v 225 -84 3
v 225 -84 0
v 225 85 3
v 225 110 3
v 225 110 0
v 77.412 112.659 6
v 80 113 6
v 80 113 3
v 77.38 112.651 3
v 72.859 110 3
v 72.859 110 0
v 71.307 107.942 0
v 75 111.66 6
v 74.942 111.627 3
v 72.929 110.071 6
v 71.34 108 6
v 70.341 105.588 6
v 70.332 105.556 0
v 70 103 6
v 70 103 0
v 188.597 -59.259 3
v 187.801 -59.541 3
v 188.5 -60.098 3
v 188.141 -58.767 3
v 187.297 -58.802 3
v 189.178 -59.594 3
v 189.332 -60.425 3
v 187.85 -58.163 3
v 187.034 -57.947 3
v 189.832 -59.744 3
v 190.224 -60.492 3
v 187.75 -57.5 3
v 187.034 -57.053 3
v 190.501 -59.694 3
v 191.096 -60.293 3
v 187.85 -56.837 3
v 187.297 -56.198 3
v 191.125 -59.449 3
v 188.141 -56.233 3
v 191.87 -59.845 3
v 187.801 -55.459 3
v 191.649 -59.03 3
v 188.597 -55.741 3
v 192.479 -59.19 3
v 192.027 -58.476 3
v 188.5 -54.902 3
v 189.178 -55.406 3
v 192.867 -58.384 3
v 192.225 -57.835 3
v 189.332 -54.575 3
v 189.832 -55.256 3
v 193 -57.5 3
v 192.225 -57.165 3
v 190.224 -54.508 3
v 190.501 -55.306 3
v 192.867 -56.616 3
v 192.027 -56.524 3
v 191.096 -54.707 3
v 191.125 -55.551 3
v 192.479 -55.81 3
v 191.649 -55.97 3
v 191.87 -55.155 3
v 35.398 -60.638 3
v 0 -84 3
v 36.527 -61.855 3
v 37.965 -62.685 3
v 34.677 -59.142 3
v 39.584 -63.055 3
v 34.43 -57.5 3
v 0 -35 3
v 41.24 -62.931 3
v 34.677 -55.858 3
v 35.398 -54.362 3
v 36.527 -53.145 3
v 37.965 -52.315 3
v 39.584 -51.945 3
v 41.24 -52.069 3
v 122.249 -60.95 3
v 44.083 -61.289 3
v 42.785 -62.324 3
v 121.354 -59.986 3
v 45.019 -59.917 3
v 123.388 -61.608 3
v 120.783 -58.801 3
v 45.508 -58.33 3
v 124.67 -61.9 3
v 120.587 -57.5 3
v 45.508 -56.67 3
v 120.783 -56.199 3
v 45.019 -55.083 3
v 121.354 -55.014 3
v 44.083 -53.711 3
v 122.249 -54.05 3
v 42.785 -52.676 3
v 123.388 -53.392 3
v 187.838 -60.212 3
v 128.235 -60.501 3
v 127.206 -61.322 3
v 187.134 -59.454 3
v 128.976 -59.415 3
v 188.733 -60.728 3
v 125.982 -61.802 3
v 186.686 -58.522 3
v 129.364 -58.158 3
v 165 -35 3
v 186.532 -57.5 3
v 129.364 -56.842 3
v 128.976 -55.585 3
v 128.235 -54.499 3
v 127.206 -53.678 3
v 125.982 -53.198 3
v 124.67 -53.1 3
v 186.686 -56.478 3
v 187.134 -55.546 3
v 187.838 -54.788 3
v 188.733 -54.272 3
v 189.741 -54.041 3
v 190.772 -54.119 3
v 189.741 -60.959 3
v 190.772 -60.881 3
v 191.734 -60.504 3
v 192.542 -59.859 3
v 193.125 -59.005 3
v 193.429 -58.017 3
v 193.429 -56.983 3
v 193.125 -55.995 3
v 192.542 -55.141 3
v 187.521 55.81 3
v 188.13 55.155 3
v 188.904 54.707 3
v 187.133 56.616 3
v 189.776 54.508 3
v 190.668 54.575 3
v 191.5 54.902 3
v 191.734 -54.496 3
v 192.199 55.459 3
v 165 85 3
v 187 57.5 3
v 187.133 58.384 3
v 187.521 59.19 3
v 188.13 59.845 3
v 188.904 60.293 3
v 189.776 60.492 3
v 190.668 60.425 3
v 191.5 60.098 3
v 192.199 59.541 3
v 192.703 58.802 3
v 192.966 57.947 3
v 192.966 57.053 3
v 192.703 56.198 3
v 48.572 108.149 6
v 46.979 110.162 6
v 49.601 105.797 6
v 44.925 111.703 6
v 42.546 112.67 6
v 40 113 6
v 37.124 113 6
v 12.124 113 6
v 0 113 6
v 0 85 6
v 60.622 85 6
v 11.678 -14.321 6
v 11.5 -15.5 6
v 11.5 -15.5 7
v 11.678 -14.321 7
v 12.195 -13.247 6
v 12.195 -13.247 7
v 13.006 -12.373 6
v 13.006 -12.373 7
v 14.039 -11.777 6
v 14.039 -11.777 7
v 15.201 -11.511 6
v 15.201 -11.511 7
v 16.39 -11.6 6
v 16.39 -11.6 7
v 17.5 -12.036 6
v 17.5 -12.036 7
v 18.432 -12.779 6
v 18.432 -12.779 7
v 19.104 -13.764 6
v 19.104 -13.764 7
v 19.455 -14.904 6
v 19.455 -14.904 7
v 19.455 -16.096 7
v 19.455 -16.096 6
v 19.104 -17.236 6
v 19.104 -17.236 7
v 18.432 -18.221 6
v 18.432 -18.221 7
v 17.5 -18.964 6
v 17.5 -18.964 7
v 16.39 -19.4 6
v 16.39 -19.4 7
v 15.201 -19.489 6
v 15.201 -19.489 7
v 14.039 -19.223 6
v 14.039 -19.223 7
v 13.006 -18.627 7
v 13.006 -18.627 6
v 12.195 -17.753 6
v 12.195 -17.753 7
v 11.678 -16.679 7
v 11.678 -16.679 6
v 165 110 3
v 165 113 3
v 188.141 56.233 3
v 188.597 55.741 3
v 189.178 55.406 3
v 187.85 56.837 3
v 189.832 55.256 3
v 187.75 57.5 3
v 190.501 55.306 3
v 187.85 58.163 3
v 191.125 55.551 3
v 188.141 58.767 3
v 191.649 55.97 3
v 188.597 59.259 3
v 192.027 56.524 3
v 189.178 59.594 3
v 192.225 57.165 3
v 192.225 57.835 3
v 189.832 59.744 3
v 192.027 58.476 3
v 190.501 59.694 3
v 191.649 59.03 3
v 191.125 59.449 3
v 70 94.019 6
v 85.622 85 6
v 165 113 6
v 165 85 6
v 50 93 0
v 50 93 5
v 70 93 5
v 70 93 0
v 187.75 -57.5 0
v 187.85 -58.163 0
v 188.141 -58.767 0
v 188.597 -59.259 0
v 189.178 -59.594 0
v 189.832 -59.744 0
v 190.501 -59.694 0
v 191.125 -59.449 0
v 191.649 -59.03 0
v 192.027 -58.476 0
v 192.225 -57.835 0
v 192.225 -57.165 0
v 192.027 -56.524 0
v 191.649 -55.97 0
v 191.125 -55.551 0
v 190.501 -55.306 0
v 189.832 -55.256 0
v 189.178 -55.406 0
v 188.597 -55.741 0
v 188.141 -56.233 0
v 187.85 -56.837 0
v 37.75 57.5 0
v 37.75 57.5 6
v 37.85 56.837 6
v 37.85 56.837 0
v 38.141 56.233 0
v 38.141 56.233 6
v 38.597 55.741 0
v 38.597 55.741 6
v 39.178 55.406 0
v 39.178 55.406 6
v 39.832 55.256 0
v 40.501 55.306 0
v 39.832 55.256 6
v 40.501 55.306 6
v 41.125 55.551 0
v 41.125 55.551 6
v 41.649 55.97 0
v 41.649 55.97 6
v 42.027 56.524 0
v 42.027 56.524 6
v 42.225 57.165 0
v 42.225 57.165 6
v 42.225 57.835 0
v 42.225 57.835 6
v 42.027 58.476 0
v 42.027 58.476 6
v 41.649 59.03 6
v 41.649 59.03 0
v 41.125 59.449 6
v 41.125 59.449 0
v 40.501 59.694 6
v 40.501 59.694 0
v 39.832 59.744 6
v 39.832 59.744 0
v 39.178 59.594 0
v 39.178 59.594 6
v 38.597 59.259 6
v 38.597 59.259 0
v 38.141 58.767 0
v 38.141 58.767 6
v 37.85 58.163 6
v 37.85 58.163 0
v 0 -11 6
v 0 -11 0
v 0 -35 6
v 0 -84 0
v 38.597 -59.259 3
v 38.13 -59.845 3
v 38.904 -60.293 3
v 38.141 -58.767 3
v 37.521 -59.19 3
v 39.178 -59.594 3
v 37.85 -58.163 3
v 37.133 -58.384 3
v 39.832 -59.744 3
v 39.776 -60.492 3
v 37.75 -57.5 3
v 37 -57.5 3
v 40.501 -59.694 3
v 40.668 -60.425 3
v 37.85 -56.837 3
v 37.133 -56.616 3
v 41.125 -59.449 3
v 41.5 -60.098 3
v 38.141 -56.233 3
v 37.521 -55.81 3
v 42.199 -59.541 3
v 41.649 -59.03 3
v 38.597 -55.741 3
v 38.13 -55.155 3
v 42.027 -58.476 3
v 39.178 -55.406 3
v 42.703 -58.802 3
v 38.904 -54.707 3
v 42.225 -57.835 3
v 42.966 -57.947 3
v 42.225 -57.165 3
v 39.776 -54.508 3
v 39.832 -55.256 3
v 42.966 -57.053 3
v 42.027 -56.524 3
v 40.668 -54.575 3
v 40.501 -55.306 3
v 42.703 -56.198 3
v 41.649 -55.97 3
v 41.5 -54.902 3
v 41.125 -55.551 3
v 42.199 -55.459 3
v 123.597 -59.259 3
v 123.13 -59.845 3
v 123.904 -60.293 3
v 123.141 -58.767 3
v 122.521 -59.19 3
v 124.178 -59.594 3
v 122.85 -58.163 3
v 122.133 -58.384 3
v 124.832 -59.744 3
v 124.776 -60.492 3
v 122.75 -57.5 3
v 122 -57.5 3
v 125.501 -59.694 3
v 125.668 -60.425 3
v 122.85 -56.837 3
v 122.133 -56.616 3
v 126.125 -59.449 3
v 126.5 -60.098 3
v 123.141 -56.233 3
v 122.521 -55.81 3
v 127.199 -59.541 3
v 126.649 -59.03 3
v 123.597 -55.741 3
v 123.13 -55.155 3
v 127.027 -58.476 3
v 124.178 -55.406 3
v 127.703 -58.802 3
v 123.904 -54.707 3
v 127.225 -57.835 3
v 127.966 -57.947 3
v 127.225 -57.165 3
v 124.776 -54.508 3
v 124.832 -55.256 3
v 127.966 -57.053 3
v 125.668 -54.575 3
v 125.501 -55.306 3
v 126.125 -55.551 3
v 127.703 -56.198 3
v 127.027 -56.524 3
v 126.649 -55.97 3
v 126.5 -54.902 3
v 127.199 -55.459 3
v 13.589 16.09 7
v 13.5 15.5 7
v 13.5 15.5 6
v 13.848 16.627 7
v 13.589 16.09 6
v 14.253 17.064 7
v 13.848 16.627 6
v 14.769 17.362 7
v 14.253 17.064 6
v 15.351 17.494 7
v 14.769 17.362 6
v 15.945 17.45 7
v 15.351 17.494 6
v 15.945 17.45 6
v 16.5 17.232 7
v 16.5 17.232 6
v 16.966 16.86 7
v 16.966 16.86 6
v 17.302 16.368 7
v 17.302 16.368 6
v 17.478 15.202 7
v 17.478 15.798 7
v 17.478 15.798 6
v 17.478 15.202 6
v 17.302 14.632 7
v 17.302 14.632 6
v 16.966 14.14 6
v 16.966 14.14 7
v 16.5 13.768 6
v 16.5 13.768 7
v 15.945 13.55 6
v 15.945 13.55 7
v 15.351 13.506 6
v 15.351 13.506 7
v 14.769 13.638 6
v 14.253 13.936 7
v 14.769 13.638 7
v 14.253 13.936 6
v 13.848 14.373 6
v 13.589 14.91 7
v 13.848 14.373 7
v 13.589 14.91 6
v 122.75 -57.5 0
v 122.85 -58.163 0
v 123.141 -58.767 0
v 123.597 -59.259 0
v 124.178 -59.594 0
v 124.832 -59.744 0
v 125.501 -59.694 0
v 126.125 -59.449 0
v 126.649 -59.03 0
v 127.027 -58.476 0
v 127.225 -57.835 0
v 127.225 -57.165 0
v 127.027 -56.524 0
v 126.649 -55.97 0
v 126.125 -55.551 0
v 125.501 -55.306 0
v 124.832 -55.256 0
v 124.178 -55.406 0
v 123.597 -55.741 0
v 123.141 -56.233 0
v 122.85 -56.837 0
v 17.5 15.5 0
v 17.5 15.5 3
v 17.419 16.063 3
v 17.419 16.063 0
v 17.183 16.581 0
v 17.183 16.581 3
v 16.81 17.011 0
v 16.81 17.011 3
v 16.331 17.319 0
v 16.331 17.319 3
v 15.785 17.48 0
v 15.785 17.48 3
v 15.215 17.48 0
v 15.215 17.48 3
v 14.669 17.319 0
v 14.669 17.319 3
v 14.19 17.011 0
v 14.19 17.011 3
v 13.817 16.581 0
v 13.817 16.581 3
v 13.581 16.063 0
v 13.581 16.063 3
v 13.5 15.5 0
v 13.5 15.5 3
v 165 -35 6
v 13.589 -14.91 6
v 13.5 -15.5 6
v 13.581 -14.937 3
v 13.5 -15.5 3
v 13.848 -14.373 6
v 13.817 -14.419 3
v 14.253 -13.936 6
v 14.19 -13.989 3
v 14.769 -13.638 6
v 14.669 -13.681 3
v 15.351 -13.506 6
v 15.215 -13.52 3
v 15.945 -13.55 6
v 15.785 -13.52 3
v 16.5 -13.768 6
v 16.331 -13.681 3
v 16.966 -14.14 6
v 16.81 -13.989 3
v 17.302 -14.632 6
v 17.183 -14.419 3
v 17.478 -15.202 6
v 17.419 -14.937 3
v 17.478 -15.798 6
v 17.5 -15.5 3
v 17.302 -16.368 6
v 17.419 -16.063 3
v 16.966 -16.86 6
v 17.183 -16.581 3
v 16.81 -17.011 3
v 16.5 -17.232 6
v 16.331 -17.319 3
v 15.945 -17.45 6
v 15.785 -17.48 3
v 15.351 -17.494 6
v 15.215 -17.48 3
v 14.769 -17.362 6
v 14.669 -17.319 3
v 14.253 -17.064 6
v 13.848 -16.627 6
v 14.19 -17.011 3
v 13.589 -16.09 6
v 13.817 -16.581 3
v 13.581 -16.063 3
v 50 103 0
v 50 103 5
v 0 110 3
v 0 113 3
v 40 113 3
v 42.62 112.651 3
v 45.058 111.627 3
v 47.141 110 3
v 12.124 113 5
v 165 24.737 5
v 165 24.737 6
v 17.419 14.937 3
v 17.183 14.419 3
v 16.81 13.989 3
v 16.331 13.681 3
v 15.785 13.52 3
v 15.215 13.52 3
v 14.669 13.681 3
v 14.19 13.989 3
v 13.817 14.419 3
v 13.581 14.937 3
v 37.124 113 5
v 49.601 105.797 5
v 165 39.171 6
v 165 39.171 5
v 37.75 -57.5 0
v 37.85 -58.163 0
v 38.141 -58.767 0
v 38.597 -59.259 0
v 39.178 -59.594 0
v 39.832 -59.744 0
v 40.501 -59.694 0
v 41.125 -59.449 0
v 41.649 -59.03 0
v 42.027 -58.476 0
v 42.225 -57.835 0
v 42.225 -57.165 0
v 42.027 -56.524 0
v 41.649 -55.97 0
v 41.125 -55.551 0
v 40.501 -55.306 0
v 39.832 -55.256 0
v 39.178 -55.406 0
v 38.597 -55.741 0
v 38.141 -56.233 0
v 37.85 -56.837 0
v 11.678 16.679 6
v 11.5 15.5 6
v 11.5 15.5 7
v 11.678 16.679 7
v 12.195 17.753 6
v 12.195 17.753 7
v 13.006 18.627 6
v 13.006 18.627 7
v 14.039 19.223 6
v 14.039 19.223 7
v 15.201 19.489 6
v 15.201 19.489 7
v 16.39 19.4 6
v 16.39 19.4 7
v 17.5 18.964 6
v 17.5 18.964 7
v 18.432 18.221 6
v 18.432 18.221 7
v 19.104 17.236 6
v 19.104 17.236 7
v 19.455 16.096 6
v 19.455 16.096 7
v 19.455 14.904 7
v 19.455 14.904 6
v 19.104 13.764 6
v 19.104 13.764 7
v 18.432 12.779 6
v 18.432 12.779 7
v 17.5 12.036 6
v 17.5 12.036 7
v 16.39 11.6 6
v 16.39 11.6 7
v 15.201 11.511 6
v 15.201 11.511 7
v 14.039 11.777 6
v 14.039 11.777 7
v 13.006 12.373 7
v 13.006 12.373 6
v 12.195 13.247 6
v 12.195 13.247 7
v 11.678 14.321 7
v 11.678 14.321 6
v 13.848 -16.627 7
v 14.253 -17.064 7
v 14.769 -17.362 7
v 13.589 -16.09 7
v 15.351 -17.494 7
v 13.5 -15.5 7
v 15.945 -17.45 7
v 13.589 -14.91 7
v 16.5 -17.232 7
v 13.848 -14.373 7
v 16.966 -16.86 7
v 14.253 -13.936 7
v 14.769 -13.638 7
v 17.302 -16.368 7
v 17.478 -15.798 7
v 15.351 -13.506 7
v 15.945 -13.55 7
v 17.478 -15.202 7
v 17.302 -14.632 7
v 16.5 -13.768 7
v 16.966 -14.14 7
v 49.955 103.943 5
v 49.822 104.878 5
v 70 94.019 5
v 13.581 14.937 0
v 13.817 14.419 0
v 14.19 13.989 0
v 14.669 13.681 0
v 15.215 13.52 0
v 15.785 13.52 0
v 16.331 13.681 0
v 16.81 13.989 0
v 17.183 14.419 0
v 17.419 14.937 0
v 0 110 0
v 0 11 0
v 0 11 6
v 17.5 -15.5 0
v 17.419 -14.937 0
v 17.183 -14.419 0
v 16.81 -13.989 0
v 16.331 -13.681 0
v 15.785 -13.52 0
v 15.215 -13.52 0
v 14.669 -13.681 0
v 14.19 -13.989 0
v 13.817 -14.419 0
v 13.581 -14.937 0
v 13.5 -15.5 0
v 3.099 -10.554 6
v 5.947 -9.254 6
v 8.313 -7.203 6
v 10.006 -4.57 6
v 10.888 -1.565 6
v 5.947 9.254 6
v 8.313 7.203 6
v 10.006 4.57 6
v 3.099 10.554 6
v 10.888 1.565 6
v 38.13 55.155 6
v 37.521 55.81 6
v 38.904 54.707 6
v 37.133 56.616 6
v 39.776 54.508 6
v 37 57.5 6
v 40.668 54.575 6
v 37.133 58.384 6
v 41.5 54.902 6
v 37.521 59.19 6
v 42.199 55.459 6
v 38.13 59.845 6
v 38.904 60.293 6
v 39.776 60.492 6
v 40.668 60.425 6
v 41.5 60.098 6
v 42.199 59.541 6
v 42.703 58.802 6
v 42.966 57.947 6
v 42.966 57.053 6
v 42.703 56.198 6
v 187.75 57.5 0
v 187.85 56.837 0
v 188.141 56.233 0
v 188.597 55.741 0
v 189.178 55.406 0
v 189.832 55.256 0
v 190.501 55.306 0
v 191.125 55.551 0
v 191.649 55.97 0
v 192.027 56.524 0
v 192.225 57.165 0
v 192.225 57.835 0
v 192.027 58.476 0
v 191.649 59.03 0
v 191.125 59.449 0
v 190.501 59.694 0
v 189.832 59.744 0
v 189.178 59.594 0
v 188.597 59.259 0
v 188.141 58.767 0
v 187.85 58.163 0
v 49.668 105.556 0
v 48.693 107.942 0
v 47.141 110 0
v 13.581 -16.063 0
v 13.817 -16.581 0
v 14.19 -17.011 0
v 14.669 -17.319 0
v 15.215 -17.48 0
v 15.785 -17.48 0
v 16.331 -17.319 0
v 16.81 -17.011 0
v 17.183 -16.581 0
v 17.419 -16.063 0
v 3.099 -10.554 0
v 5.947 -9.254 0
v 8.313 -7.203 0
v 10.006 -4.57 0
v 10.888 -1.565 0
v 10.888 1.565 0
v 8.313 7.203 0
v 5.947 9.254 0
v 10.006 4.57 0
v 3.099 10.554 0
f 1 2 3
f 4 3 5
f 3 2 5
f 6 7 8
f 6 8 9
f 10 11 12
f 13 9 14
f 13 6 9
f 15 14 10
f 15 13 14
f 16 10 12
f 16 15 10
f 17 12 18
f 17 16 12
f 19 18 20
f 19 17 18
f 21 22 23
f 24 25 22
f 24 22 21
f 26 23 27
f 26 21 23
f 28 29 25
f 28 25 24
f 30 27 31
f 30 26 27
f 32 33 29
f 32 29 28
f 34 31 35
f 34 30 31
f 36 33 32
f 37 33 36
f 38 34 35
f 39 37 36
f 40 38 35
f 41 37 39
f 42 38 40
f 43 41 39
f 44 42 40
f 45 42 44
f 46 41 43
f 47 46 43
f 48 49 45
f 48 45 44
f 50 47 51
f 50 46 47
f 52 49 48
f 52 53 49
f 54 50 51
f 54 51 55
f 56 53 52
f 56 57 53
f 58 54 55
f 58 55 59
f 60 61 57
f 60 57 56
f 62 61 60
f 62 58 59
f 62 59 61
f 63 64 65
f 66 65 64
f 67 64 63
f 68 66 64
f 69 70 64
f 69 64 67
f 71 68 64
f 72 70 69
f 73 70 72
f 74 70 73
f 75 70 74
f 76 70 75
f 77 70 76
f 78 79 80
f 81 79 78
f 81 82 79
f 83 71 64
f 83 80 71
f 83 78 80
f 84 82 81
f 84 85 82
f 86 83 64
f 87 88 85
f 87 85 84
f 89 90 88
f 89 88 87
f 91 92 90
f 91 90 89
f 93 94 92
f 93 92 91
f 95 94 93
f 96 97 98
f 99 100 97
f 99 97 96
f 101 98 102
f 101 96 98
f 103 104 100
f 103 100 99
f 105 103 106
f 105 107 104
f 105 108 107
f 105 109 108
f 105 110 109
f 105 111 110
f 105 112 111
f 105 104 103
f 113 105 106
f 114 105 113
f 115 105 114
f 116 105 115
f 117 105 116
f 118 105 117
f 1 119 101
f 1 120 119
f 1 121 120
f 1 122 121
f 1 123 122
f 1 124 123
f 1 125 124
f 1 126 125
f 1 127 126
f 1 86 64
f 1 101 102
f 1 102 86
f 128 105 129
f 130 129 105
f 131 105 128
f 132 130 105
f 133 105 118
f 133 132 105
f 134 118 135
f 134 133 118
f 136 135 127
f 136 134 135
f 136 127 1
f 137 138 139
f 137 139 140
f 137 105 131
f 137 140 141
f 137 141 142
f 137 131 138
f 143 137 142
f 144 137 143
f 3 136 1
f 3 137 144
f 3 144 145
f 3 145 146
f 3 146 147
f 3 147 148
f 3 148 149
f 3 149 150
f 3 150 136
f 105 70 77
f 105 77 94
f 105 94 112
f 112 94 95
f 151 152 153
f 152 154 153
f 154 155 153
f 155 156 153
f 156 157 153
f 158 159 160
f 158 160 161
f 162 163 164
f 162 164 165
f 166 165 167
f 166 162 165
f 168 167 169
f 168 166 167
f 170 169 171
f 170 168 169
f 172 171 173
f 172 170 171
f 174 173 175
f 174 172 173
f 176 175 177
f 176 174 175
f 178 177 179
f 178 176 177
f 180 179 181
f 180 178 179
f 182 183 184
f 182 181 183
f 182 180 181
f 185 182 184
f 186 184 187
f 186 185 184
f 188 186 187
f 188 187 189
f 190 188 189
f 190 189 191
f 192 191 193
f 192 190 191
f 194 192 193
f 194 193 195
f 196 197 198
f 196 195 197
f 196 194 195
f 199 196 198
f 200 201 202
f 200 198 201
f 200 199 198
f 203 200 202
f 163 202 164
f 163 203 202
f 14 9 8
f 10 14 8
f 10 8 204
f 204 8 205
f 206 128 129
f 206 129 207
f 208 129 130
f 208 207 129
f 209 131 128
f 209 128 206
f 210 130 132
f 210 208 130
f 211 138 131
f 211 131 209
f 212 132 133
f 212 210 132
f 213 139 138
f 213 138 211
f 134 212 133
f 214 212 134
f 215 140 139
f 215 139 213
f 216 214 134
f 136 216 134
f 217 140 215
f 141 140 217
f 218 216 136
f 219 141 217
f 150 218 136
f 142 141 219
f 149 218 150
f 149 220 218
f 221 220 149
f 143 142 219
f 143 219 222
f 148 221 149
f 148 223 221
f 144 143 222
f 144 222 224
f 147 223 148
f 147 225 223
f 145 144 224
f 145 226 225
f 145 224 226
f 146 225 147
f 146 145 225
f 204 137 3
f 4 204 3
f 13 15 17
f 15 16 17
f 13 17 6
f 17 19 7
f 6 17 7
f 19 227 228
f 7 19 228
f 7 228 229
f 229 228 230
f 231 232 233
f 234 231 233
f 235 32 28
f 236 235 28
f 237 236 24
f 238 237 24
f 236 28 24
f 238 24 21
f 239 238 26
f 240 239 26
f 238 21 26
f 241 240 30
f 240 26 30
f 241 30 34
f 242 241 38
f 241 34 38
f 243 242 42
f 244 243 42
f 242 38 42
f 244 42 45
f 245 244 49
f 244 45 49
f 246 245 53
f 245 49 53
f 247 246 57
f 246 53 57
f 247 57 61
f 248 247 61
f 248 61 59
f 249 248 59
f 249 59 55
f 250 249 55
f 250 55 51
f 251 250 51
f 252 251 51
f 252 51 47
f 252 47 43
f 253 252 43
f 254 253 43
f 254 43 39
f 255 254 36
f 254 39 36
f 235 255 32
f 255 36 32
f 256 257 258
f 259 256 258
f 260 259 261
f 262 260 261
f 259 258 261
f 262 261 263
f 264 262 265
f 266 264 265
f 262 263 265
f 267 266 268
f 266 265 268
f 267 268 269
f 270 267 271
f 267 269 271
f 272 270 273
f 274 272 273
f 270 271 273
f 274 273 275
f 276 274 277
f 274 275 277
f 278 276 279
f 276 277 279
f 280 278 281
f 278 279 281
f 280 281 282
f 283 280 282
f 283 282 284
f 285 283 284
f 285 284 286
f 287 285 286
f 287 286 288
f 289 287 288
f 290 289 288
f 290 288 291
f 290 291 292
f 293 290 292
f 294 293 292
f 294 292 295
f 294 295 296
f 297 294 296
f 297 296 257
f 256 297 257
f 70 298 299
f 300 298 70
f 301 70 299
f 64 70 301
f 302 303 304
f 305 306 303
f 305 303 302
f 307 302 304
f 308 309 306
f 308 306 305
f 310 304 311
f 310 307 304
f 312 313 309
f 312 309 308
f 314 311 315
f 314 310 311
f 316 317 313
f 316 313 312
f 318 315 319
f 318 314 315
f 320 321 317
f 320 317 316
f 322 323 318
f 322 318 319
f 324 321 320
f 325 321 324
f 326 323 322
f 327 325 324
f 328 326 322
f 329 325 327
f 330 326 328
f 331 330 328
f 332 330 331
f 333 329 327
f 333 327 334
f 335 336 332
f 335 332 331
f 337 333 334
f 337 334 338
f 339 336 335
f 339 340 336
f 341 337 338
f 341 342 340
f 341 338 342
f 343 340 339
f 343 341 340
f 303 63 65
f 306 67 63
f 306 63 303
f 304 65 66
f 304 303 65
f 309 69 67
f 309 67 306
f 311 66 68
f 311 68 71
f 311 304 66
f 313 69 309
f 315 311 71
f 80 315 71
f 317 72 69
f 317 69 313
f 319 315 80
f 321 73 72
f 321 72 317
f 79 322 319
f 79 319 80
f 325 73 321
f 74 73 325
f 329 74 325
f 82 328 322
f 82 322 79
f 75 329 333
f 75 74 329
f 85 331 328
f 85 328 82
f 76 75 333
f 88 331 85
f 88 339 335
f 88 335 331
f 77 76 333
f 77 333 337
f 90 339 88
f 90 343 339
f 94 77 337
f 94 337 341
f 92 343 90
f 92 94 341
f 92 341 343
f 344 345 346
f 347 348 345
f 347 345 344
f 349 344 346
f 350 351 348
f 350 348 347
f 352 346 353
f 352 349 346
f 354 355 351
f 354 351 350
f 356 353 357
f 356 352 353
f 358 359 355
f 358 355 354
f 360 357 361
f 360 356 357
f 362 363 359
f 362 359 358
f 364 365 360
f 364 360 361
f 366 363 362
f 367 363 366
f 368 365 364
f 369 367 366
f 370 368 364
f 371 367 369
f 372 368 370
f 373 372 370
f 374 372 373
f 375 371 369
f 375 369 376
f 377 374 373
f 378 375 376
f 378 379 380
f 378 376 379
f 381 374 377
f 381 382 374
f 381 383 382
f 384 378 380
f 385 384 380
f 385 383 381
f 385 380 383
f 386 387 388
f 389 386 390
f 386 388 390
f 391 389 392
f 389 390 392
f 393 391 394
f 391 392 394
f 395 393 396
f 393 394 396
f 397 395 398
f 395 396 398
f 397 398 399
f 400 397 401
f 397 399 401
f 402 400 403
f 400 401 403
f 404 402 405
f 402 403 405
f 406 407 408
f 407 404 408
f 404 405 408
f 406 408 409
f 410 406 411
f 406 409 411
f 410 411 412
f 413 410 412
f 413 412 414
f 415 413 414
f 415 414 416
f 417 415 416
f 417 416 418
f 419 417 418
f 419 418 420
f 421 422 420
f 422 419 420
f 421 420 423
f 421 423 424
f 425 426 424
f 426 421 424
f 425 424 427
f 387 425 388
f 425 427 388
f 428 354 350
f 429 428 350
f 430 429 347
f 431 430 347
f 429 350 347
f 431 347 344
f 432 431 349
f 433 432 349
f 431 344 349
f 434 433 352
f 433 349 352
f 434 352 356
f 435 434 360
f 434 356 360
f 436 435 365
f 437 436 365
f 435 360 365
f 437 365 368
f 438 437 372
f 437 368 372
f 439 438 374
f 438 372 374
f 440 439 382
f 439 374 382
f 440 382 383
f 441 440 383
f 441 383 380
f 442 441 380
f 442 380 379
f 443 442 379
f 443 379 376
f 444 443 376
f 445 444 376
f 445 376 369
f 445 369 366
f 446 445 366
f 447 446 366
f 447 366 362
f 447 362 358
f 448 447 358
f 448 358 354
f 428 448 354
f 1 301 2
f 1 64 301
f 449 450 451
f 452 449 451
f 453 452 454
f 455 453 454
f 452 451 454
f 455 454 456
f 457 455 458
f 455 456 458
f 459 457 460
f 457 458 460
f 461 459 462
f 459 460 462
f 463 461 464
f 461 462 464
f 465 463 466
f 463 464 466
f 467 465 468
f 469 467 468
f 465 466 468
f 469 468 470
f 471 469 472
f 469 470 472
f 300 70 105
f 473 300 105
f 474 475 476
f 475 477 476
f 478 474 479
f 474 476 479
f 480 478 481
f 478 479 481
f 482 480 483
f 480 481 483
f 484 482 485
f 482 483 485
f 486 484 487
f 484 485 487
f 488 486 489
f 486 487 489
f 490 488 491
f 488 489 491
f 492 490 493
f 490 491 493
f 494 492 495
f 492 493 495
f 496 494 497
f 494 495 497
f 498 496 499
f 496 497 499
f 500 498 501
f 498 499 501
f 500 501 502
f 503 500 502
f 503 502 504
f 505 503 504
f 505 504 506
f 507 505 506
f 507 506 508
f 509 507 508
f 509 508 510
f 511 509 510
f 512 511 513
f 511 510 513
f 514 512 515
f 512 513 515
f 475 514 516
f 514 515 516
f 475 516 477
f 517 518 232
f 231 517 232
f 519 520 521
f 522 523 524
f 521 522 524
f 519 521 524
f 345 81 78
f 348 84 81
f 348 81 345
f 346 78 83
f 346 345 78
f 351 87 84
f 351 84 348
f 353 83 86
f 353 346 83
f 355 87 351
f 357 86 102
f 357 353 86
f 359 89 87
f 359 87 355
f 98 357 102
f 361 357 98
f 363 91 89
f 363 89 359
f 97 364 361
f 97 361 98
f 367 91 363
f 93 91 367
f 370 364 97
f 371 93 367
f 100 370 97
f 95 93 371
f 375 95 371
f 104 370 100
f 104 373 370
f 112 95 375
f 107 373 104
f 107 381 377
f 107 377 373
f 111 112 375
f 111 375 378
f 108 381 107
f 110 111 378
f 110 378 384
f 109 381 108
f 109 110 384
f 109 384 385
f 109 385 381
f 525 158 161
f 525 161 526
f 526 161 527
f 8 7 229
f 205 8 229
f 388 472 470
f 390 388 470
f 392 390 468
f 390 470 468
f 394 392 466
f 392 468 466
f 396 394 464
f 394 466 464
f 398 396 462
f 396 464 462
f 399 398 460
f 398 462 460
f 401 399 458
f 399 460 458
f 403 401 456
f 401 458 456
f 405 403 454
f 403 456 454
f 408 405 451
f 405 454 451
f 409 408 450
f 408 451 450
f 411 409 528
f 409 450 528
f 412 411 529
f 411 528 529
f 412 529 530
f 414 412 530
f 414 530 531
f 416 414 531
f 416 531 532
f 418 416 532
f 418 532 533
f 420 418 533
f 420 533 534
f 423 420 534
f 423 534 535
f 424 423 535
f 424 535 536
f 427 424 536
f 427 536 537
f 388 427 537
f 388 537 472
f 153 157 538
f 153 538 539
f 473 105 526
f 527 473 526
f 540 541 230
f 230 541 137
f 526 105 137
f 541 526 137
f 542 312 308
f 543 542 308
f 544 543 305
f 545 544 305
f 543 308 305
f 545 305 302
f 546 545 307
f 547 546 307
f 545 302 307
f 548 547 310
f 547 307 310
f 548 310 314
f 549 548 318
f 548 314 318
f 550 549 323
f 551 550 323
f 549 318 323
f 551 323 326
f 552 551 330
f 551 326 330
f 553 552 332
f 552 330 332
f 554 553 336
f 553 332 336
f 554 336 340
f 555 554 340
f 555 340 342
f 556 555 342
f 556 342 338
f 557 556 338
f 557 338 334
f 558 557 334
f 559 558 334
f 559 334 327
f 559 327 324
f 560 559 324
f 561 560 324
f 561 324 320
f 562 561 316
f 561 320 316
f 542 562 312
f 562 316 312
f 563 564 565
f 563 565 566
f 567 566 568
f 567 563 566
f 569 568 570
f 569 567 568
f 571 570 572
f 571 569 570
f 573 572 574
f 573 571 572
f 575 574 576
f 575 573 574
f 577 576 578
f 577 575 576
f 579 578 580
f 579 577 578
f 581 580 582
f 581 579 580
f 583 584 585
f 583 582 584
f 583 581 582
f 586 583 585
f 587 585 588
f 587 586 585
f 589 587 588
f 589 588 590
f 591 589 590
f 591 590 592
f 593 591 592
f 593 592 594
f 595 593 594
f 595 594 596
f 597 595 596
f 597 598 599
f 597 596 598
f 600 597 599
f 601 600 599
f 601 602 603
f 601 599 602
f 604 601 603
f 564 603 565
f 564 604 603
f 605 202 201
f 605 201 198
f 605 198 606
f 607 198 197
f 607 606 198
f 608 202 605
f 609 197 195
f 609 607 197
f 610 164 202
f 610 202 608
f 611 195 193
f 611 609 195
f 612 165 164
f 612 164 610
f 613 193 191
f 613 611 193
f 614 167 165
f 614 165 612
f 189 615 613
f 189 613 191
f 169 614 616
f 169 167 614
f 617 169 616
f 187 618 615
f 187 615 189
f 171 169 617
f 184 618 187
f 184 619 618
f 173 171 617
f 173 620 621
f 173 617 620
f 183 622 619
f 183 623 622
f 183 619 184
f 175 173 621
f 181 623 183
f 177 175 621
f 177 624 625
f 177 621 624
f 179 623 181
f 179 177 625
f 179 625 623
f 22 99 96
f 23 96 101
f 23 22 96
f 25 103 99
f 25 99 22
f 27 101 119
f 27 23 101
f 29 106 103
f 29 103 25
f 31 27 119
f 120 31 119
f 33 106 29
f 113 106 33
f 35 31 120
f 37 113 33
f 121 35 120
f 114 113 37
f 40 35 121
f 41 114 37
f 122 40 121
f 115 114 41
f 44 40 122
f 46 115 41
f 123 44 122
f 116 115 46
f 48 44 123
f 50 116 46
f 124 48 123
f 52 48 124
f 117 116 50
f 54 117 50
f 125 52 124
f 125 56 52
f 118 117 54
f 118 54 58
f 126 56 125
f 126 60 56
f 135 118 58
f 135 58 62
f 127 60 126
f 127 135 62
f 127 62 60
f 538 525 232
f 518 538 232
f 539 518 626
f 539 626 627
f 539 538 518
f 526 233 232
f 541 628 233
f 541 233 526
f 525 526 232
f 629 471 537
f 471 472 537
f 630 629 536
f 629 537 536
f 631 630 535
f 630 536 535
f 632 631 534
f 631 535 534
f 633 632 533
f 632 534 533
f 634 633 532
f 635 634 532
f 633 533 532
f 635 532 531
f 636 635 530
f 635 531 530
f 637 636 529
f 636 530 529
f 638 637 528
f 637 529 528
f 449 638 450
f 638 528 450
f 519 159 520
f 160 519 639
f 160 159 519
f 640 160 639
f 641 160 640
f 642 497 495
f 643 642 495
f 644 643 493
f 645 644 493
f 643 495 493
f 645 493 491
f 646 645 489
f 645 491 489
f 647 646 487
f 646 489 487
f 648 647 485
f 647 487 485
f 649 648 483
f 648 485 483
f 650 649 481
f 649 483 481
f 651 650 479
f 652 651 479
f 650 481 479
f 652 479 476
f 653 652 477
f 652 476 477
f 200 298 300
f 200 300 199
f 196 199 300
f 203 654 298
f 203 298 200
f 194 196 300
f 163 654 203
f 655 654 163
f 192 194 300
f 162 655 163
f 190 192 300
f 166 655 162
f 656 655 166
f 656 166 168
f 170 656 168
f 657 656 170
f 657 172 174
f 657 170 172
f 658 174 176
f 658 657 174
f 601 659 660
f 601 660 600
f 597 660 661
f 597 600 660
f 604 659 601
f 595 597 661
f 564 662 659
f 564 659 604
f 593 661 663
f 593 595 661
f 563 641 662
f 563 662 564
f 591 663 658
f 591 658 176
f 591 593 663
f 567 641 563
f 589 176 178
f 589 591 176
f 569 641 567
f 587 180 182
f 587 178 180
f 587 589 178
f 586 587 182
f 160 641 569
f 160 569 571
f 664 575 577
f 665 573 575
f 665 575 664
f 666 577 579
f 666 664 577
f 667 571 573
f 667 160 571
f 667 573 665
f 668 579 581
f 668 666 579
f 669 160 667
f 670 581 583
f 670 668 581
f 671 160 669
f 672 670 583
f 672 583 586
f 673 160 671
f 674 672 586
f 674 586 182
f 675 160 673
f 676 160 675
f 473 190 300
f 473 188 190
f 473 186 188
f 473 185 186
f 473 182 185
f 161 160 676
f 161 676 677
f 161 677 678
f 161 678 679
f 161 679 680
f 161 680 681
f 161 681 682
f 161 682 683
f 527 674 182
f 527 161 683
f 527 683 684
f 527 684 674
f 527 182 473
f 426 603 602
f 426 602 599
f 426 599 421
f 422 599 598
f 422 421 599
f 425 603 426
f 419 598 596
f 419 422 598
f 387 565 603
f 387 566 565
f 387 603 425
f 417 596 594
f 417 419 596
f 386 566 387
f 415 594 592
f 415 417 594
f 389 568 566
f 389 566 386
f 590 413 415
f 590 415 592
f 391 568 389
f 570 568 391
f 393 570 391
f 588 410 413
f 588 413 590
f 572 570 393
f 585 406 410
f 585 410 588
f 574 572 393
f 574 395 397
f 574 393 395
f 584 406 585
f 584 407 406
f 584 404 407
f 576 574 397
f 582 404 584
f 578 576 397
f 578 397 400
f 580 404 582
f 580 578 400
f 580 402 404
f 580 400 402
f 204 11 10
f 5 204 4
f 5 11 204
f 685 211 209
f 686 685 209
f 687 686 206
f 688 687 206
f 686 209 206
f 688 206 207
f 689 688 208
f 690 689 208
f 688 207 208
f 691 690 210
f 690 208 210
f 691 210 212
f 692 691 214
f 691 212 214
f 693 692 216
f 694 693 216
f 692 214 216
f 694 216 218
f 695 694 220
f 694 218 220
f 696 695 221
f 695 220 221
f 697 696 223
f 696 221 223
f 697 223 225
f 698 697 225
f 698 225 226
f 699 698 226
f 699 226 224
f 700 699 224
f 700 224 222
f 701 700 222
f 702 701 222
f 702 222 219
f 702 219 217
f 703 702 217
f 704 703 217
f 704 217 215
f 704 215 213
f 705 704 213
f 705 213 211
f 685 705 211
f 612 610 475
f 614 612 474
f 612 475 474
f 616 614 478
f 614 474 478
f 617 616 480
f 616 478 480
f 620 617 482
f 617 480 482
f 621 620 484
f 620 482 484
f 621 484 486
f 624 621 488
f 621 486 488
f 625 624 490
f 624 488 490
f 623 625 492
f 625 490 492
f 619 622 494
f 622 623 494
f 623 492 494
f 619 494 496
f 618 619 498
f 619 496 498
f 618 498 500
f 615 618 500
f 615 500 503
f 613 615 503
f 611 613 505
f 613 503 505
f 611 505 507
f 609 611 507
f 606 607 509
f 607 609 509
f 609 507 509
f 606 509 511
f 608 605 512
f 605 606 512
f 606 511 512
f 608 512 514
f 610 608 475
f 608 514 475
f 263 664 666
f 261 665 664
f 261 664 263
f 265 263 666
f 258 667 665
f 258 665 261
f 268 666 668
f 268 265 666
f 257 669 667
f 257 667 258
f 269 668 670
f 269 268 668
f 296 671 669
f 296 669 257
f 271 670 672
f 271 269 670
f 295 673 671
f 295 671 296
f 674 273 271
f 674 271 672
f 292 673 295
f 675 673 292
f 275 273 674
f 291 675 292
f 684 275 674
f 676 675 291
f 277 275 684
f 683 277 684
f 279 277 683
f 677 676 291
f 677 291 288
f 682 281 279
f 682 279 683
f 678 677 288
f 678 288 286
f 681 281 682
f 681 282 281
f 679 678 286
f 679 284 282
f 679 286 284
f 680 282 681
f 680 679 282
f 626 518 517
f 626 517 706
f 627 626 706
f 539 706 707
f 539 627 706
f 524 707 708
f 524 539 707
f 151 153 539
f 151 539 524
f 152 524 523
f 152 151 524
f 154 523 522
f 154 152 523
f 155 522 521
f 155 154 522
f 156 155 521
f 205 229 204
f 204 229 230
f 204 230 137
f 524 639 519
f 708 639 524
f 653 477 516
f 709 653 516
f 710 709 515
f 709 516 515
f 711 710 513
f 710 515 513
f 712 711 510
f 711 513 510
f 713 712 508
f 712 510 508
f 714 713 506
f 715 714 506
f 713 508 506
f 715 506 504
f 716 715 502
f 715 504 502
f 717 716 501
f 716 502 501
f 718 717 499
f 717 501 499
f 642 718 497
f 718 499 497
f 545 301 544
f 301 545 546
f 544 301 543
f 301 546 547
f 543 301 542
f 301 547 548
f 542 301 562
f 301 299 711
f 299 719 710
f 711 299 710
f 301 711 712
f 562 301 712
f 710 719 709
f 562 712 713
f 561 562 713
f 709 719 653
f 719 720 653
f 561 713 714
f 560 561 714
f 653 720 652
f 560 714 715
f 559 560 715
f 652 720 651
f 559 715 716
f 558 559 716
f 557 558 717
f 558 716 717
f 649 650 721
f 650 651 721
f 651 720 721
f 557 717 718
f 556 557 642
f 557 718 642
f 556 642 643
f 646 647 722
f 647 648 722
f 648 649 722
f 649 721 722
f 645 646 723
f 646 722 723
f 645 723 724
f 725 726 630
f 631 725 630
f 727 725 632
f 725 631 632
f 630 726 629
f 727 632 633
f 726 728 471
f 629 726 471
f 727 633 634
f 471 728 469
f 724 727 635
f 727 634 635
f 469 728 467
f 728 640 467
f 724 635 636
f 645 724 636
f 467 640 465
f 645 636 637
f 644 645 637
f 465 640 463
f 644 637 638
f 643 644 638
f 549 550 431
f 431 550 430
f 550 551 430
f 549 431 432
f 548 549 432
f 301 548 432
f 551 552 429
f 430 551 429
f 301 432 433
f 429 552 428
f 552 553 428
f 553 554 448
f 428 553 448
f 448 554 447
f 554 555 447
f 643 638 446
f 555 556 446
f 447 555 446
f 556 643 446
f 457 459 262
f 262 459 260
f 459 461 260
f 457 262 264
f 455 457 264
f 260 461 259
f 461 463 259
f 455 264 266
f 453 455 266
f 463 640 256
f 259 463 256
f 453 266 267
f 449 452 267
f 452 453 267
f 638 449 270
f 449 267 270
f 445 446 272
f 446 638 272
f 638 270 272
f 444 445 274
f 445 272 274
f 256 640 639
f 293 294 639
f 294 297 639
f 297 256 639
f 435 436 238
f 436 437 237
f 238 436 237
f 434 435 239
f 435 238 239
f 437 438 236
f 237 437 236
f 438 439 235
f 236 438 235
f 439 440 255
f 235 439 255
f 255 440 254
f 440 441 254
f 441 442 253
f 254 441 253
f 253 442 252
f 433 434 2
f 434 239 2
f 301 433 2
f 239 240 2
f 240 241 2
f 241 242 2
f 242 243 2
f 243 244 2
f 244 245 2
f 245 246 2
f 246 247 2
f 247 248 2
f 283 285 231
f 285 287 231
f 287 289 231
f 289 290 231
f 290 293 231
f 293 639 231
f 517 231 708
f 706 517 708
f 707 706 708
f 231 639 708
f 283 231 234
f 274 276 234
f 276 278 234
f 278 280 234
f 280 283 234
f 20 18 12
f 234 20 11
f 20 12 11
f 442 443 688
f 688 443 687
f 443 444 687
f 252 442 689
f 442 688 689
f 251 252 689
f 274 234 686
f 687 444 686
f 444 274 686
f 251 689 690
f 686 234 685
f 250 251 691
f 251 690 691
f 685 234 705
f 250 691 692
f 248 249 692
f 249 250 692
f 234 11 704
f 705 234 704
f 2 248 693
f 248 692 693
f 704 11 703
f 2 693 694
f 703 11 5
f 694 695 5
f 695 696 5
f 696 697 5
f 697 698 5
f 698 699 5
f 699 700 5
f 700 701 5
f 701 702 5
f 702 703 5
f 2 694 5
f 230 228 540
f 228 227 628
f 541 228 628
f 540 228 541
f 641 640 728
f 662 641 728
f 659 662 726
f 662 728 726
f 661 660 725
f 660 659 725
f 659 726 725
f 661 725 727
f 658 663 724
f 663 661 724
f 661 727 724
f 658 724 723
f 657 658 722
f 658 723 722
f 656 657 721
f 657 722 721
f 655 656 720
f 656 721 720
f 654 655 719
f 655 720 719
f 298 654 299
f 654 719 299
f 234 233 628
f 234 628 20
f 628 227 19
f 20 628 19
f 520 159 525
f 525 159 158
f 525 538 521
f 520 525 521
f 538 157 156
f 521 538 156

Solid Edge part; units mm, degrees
sketch "Sketch1" plane through (0, 0, 0) normal (0, 0, 1) x (1, 0, 0)
  line L0 (-225, -85) -> (225, -85)
  line L1 (225, -85) -> (225, 85)
  line L2 (225, 85) -> (-225, 85)
  line L3 (-225, 85) -> (-225, -85)
  dimension "D1" = 450
  dimension "D2" = 170
extrude "Protrusion1" add sketch "Sketch1" along normal blind 3
sketch "Sketch2" plane through (0, 0, 3) normal (0, 0, 1) x (1, 0, 0)
  circle A0 centre (-190, 57.5) radius 3
  circle A1 centre (-190, -57.5) radius 3
  circle A2 centre (190, -57.5) radius 3
  circle A3 centre (190, 57.5) radius 3
  dimension "D1" = 380
  dimension "D2" = 115
  dimension "D3" = 6
extrude "Cutout1" cut sketch "Sketch2" against normal through all
sketch "Sketch3" plane through (0, 0, 3) normal (0, 0, 1) x (1, 0, 0)
  circle A0 centre (-15.5, 15.5) radius 2
  circle A1 centre (15.5, 15.5) radius 2
  circle A2 centre (15.5, -15.5) radius 2
  circle A3 centre (-15.5, -15.5) radius 2
  dimension "D1" = 31
  dimension "D2" = 4
extrude "Cutout2" cut sketch "Sketch3" against normal through all
sketch "Sketch4" plane through (-112.5, 0, 3) normal (0, 0, 1) x (1, 0, 0)
  circle A0 centre (-12.5, -57.5) radius 3
  dimension "D1" = 125
  dimension "D2" = 6
extrude "Cutout3" cut sketch "Sketch4" against normal through all
sketch "Sketch5" plane through (-112.5, 0, 3) normal (0, 0, 1) x (1, 0, 0)
  line L0 (112.5, 85) -> (-52.5, 85)
  line L1 (-52.5, 85) -> (-52.5, -35)
  line L2 (-52.5, -35) -> (112.5, -35)
  line L3 (112.5, -35) -> (112.5, 85)
  dimension "D1" = 120
  dimension "D2" = 165
extrude "Protrusion2" add sketch "Sketch5" along normal blind 3
sketch "Sketch6" plane through (-112.5, 0, 3) normal (0, 0, 1) x (1, 0, 0)
  circle A0 centre (72.5, -57.5) radius 3
  circle A1 centre (72.5, 57.5) radius 3
extrude "Cutout4" cut sketch "Sketch6" against normal through all
sketch "Sketch7" plane through (-112.5, 0, 0) normal (0, 0, -1) x (1, 0, 0)
  circle A0 centre (97, 15.5) radius 2
  circle A1 centre (97, -15.5) radius 2
  circle A2 centre (72.5, -57.5) radius 3
extrude "Cutout5" cut sketch "Sketch7" against normal through all
mirror "Mirror1" about plane through (0, 0, 0) normal (1, 0, 0) of "Protrusion2", "Cutout3"
mirror "Mirror2" about plane through (0, 0, 0) normal (1, 0, 0) of "Protrusion2", "Cutout3", "Cutout1"
mirror "Mirror3" about plane through (0, 0, 0) normal (1, 0, 0) of "Cutout5", "Cutout4"
sketch "Sketch8" plane through (0, 25, 6) normal (0, 0, 1) x (1, 0, 0)
  line L0 (0, 60) -> (0, -110)
extrude "Cutout8" cut sketch "Sketch8" against normal through all material side at (-0.05, 0, 6)
sketch "Sketch9" plane through (112.5, 0, 0) normal (0, 0, -1) x (1, 0, 0)
  circle A0 centre (-112.5, 0) radius 11
extrude "Cutout9" cut sketch "Sketch9" against normal through all
sketch "Sketch10" plane through (112.5, 0, 3) normal (0, 0, 1) x (-1, 0, 0)
  line L0 (-112.5, 85) -> (112.5, 85)
  line L1 (112.5, 85) -> (112.5, 84)
  line L2 (112.5, 84) -> (-112.5, 84)
  line L3 (-112.5, 84) -> (-112.5, 85)
  dimension "D1" = 1
extrude "Cutout10" cut sketch "Sketch10" against normal through all
sketch "Sketch11" plane through (112.5, 85, 3) normal (0, 1, 0) x (-1, 0, 0)
  line L0 (-112.5, -3) -> (112.5, -3)
  line L1 (112.5, -3) -> (112.5, 3)
  line L2 (112.5, 3) -> (-52.5, 3)
  line L3 (-52.5, 3) -> (-52.5, 0)
  line L4 (-52.5, 0) -> (-112.5, 0)
  line L5 (-112.5, 0) -> (-112.5, -3)
extrude "Extrusionsausprägung_4" add sketch "Sketch11" along normal blind 35
sketch "Sketch12" plane through (82.5, 42.5, 6) normal (0, 0, 1) x (0, 1, 0)
  line L0 (77.5, 82.5) -> (-17.7628, -82.5)
  line L1 (-17.7628, -82.5) -> (-3.329, -82.5)
  line L2 (77.5, 57.5) -> (-3.329, -82.5)
  line L3 (77.5, 57.5) -> (77.5, 82.5)
  dimension "D1" = 25
extrude "Extrusionsausschnitt_12" cut sketch "Sketch12" against normal blind 1
sketch "Sketch13" plane through (112.5, 18, 0) normal (0, 0, -1) x (-1, 0, 0)
  line L0 (-112.5, 102) -> (112.5, 102)
  line L1 (112.5, 102) -> (112.5, 92)
  line L2 (112.5, 92) -> (-112.5, 92)
  line L3 (-112.5, 92) -> (-112.5, 102)
  dimension "D1" = 10
extrude "Extrusionsausschnitt_13" cut sketch "Sketch13" against normal blind 3
sketch "Sketch14" plane through (82.5, 42.5, 6) normal (0, 0, 1) x (-1, 0, 0)
  circle A0 centre (42.5, -15) radius 3
  circle A1 centre (42.5, -15) radius 2.25
extrude "Protrusion4" add sketch "Sketch14" against normal up to vertex (6 mm away)
sketch "Sketch15" plane through (112.5, 13, 3) normal (0, 0, 1) x (-1, 0, 0)
  circle A0 centre (-77.5, 70.5) radius 2.25
  circle A1 centre (-12.5, 70.5) radius 2.25
  circle A2 centre (72.5, 70.5) radius 2.25
  circle A3 centre (-77.5, -44.5) radius 2.25
  circle A4 centre (-77.5, 70.5) radius 3.4682
  circle A5 centre (-12.5, 70.5) radius 4.4128
  circle A6 centre (72.5, 70.5) radius 5.5704
  circle A7 centre (-77.5, -44.5) radius 3
extrude "Protrusion5" add sketch "Sketch15" against normal up to vertex (3 mm away)
sketch "Sketch16" plane through (82.5, 42.5, 6) normal (0, 0, 1) x (-1, 0, 0)
  circle A0 centre (67, 58) radius 2
  circle A1 centre (67, 58) radius 4
  circle A2 centre (67, 27) radius 4
  circle A3 centre (67, 27) radius 2
  dimension "D1" = 8
extrude "Extrusionsausprägung_7" add sketch "Sketch16" along normal blind 1
sketch "Sketch17" plane through (95, 79.5855, 6) normal (0, 0, 1) x (-1, 0, 0)
  line L0 (-70, -40.4145) -> (95, -40.4145)
  line L1 (95, -40.4145) -> (95, -33.4145)
  line L2 (95, -33.4145) -> (-70, -33.4145)
  line L3 (-70, -33.4145) -> (-70, -40.4145)
  dimension "D1" = 7
extrude "Cutout11" cut sketch "Sketch17" against normal up to next
sketch "Sketch18" plane through (82.5, 39, 6) normal (0, 0, 1) x (-1, 0, 0)
  line L0 (12.5, -74) -> (32.5, -74)
  line L1 (32.5, -74) -> (32.5, -54)
  line L2 (32.5, -54) -> (12.5, -54)
  line L3 (12.5, -54) -> (12.5, -74)
  dimension "D1" = 20
  dimension "D2" = 20
  dimension "D3" = 60
extrude "Cutout12" cut sketch "Sketch18" against normal through all
fillet "Verrundung_1" radius 10 2 edges at (70, 113, 4.5) (50, 113, 4.5)
properties material "Nylon, allgemein"
